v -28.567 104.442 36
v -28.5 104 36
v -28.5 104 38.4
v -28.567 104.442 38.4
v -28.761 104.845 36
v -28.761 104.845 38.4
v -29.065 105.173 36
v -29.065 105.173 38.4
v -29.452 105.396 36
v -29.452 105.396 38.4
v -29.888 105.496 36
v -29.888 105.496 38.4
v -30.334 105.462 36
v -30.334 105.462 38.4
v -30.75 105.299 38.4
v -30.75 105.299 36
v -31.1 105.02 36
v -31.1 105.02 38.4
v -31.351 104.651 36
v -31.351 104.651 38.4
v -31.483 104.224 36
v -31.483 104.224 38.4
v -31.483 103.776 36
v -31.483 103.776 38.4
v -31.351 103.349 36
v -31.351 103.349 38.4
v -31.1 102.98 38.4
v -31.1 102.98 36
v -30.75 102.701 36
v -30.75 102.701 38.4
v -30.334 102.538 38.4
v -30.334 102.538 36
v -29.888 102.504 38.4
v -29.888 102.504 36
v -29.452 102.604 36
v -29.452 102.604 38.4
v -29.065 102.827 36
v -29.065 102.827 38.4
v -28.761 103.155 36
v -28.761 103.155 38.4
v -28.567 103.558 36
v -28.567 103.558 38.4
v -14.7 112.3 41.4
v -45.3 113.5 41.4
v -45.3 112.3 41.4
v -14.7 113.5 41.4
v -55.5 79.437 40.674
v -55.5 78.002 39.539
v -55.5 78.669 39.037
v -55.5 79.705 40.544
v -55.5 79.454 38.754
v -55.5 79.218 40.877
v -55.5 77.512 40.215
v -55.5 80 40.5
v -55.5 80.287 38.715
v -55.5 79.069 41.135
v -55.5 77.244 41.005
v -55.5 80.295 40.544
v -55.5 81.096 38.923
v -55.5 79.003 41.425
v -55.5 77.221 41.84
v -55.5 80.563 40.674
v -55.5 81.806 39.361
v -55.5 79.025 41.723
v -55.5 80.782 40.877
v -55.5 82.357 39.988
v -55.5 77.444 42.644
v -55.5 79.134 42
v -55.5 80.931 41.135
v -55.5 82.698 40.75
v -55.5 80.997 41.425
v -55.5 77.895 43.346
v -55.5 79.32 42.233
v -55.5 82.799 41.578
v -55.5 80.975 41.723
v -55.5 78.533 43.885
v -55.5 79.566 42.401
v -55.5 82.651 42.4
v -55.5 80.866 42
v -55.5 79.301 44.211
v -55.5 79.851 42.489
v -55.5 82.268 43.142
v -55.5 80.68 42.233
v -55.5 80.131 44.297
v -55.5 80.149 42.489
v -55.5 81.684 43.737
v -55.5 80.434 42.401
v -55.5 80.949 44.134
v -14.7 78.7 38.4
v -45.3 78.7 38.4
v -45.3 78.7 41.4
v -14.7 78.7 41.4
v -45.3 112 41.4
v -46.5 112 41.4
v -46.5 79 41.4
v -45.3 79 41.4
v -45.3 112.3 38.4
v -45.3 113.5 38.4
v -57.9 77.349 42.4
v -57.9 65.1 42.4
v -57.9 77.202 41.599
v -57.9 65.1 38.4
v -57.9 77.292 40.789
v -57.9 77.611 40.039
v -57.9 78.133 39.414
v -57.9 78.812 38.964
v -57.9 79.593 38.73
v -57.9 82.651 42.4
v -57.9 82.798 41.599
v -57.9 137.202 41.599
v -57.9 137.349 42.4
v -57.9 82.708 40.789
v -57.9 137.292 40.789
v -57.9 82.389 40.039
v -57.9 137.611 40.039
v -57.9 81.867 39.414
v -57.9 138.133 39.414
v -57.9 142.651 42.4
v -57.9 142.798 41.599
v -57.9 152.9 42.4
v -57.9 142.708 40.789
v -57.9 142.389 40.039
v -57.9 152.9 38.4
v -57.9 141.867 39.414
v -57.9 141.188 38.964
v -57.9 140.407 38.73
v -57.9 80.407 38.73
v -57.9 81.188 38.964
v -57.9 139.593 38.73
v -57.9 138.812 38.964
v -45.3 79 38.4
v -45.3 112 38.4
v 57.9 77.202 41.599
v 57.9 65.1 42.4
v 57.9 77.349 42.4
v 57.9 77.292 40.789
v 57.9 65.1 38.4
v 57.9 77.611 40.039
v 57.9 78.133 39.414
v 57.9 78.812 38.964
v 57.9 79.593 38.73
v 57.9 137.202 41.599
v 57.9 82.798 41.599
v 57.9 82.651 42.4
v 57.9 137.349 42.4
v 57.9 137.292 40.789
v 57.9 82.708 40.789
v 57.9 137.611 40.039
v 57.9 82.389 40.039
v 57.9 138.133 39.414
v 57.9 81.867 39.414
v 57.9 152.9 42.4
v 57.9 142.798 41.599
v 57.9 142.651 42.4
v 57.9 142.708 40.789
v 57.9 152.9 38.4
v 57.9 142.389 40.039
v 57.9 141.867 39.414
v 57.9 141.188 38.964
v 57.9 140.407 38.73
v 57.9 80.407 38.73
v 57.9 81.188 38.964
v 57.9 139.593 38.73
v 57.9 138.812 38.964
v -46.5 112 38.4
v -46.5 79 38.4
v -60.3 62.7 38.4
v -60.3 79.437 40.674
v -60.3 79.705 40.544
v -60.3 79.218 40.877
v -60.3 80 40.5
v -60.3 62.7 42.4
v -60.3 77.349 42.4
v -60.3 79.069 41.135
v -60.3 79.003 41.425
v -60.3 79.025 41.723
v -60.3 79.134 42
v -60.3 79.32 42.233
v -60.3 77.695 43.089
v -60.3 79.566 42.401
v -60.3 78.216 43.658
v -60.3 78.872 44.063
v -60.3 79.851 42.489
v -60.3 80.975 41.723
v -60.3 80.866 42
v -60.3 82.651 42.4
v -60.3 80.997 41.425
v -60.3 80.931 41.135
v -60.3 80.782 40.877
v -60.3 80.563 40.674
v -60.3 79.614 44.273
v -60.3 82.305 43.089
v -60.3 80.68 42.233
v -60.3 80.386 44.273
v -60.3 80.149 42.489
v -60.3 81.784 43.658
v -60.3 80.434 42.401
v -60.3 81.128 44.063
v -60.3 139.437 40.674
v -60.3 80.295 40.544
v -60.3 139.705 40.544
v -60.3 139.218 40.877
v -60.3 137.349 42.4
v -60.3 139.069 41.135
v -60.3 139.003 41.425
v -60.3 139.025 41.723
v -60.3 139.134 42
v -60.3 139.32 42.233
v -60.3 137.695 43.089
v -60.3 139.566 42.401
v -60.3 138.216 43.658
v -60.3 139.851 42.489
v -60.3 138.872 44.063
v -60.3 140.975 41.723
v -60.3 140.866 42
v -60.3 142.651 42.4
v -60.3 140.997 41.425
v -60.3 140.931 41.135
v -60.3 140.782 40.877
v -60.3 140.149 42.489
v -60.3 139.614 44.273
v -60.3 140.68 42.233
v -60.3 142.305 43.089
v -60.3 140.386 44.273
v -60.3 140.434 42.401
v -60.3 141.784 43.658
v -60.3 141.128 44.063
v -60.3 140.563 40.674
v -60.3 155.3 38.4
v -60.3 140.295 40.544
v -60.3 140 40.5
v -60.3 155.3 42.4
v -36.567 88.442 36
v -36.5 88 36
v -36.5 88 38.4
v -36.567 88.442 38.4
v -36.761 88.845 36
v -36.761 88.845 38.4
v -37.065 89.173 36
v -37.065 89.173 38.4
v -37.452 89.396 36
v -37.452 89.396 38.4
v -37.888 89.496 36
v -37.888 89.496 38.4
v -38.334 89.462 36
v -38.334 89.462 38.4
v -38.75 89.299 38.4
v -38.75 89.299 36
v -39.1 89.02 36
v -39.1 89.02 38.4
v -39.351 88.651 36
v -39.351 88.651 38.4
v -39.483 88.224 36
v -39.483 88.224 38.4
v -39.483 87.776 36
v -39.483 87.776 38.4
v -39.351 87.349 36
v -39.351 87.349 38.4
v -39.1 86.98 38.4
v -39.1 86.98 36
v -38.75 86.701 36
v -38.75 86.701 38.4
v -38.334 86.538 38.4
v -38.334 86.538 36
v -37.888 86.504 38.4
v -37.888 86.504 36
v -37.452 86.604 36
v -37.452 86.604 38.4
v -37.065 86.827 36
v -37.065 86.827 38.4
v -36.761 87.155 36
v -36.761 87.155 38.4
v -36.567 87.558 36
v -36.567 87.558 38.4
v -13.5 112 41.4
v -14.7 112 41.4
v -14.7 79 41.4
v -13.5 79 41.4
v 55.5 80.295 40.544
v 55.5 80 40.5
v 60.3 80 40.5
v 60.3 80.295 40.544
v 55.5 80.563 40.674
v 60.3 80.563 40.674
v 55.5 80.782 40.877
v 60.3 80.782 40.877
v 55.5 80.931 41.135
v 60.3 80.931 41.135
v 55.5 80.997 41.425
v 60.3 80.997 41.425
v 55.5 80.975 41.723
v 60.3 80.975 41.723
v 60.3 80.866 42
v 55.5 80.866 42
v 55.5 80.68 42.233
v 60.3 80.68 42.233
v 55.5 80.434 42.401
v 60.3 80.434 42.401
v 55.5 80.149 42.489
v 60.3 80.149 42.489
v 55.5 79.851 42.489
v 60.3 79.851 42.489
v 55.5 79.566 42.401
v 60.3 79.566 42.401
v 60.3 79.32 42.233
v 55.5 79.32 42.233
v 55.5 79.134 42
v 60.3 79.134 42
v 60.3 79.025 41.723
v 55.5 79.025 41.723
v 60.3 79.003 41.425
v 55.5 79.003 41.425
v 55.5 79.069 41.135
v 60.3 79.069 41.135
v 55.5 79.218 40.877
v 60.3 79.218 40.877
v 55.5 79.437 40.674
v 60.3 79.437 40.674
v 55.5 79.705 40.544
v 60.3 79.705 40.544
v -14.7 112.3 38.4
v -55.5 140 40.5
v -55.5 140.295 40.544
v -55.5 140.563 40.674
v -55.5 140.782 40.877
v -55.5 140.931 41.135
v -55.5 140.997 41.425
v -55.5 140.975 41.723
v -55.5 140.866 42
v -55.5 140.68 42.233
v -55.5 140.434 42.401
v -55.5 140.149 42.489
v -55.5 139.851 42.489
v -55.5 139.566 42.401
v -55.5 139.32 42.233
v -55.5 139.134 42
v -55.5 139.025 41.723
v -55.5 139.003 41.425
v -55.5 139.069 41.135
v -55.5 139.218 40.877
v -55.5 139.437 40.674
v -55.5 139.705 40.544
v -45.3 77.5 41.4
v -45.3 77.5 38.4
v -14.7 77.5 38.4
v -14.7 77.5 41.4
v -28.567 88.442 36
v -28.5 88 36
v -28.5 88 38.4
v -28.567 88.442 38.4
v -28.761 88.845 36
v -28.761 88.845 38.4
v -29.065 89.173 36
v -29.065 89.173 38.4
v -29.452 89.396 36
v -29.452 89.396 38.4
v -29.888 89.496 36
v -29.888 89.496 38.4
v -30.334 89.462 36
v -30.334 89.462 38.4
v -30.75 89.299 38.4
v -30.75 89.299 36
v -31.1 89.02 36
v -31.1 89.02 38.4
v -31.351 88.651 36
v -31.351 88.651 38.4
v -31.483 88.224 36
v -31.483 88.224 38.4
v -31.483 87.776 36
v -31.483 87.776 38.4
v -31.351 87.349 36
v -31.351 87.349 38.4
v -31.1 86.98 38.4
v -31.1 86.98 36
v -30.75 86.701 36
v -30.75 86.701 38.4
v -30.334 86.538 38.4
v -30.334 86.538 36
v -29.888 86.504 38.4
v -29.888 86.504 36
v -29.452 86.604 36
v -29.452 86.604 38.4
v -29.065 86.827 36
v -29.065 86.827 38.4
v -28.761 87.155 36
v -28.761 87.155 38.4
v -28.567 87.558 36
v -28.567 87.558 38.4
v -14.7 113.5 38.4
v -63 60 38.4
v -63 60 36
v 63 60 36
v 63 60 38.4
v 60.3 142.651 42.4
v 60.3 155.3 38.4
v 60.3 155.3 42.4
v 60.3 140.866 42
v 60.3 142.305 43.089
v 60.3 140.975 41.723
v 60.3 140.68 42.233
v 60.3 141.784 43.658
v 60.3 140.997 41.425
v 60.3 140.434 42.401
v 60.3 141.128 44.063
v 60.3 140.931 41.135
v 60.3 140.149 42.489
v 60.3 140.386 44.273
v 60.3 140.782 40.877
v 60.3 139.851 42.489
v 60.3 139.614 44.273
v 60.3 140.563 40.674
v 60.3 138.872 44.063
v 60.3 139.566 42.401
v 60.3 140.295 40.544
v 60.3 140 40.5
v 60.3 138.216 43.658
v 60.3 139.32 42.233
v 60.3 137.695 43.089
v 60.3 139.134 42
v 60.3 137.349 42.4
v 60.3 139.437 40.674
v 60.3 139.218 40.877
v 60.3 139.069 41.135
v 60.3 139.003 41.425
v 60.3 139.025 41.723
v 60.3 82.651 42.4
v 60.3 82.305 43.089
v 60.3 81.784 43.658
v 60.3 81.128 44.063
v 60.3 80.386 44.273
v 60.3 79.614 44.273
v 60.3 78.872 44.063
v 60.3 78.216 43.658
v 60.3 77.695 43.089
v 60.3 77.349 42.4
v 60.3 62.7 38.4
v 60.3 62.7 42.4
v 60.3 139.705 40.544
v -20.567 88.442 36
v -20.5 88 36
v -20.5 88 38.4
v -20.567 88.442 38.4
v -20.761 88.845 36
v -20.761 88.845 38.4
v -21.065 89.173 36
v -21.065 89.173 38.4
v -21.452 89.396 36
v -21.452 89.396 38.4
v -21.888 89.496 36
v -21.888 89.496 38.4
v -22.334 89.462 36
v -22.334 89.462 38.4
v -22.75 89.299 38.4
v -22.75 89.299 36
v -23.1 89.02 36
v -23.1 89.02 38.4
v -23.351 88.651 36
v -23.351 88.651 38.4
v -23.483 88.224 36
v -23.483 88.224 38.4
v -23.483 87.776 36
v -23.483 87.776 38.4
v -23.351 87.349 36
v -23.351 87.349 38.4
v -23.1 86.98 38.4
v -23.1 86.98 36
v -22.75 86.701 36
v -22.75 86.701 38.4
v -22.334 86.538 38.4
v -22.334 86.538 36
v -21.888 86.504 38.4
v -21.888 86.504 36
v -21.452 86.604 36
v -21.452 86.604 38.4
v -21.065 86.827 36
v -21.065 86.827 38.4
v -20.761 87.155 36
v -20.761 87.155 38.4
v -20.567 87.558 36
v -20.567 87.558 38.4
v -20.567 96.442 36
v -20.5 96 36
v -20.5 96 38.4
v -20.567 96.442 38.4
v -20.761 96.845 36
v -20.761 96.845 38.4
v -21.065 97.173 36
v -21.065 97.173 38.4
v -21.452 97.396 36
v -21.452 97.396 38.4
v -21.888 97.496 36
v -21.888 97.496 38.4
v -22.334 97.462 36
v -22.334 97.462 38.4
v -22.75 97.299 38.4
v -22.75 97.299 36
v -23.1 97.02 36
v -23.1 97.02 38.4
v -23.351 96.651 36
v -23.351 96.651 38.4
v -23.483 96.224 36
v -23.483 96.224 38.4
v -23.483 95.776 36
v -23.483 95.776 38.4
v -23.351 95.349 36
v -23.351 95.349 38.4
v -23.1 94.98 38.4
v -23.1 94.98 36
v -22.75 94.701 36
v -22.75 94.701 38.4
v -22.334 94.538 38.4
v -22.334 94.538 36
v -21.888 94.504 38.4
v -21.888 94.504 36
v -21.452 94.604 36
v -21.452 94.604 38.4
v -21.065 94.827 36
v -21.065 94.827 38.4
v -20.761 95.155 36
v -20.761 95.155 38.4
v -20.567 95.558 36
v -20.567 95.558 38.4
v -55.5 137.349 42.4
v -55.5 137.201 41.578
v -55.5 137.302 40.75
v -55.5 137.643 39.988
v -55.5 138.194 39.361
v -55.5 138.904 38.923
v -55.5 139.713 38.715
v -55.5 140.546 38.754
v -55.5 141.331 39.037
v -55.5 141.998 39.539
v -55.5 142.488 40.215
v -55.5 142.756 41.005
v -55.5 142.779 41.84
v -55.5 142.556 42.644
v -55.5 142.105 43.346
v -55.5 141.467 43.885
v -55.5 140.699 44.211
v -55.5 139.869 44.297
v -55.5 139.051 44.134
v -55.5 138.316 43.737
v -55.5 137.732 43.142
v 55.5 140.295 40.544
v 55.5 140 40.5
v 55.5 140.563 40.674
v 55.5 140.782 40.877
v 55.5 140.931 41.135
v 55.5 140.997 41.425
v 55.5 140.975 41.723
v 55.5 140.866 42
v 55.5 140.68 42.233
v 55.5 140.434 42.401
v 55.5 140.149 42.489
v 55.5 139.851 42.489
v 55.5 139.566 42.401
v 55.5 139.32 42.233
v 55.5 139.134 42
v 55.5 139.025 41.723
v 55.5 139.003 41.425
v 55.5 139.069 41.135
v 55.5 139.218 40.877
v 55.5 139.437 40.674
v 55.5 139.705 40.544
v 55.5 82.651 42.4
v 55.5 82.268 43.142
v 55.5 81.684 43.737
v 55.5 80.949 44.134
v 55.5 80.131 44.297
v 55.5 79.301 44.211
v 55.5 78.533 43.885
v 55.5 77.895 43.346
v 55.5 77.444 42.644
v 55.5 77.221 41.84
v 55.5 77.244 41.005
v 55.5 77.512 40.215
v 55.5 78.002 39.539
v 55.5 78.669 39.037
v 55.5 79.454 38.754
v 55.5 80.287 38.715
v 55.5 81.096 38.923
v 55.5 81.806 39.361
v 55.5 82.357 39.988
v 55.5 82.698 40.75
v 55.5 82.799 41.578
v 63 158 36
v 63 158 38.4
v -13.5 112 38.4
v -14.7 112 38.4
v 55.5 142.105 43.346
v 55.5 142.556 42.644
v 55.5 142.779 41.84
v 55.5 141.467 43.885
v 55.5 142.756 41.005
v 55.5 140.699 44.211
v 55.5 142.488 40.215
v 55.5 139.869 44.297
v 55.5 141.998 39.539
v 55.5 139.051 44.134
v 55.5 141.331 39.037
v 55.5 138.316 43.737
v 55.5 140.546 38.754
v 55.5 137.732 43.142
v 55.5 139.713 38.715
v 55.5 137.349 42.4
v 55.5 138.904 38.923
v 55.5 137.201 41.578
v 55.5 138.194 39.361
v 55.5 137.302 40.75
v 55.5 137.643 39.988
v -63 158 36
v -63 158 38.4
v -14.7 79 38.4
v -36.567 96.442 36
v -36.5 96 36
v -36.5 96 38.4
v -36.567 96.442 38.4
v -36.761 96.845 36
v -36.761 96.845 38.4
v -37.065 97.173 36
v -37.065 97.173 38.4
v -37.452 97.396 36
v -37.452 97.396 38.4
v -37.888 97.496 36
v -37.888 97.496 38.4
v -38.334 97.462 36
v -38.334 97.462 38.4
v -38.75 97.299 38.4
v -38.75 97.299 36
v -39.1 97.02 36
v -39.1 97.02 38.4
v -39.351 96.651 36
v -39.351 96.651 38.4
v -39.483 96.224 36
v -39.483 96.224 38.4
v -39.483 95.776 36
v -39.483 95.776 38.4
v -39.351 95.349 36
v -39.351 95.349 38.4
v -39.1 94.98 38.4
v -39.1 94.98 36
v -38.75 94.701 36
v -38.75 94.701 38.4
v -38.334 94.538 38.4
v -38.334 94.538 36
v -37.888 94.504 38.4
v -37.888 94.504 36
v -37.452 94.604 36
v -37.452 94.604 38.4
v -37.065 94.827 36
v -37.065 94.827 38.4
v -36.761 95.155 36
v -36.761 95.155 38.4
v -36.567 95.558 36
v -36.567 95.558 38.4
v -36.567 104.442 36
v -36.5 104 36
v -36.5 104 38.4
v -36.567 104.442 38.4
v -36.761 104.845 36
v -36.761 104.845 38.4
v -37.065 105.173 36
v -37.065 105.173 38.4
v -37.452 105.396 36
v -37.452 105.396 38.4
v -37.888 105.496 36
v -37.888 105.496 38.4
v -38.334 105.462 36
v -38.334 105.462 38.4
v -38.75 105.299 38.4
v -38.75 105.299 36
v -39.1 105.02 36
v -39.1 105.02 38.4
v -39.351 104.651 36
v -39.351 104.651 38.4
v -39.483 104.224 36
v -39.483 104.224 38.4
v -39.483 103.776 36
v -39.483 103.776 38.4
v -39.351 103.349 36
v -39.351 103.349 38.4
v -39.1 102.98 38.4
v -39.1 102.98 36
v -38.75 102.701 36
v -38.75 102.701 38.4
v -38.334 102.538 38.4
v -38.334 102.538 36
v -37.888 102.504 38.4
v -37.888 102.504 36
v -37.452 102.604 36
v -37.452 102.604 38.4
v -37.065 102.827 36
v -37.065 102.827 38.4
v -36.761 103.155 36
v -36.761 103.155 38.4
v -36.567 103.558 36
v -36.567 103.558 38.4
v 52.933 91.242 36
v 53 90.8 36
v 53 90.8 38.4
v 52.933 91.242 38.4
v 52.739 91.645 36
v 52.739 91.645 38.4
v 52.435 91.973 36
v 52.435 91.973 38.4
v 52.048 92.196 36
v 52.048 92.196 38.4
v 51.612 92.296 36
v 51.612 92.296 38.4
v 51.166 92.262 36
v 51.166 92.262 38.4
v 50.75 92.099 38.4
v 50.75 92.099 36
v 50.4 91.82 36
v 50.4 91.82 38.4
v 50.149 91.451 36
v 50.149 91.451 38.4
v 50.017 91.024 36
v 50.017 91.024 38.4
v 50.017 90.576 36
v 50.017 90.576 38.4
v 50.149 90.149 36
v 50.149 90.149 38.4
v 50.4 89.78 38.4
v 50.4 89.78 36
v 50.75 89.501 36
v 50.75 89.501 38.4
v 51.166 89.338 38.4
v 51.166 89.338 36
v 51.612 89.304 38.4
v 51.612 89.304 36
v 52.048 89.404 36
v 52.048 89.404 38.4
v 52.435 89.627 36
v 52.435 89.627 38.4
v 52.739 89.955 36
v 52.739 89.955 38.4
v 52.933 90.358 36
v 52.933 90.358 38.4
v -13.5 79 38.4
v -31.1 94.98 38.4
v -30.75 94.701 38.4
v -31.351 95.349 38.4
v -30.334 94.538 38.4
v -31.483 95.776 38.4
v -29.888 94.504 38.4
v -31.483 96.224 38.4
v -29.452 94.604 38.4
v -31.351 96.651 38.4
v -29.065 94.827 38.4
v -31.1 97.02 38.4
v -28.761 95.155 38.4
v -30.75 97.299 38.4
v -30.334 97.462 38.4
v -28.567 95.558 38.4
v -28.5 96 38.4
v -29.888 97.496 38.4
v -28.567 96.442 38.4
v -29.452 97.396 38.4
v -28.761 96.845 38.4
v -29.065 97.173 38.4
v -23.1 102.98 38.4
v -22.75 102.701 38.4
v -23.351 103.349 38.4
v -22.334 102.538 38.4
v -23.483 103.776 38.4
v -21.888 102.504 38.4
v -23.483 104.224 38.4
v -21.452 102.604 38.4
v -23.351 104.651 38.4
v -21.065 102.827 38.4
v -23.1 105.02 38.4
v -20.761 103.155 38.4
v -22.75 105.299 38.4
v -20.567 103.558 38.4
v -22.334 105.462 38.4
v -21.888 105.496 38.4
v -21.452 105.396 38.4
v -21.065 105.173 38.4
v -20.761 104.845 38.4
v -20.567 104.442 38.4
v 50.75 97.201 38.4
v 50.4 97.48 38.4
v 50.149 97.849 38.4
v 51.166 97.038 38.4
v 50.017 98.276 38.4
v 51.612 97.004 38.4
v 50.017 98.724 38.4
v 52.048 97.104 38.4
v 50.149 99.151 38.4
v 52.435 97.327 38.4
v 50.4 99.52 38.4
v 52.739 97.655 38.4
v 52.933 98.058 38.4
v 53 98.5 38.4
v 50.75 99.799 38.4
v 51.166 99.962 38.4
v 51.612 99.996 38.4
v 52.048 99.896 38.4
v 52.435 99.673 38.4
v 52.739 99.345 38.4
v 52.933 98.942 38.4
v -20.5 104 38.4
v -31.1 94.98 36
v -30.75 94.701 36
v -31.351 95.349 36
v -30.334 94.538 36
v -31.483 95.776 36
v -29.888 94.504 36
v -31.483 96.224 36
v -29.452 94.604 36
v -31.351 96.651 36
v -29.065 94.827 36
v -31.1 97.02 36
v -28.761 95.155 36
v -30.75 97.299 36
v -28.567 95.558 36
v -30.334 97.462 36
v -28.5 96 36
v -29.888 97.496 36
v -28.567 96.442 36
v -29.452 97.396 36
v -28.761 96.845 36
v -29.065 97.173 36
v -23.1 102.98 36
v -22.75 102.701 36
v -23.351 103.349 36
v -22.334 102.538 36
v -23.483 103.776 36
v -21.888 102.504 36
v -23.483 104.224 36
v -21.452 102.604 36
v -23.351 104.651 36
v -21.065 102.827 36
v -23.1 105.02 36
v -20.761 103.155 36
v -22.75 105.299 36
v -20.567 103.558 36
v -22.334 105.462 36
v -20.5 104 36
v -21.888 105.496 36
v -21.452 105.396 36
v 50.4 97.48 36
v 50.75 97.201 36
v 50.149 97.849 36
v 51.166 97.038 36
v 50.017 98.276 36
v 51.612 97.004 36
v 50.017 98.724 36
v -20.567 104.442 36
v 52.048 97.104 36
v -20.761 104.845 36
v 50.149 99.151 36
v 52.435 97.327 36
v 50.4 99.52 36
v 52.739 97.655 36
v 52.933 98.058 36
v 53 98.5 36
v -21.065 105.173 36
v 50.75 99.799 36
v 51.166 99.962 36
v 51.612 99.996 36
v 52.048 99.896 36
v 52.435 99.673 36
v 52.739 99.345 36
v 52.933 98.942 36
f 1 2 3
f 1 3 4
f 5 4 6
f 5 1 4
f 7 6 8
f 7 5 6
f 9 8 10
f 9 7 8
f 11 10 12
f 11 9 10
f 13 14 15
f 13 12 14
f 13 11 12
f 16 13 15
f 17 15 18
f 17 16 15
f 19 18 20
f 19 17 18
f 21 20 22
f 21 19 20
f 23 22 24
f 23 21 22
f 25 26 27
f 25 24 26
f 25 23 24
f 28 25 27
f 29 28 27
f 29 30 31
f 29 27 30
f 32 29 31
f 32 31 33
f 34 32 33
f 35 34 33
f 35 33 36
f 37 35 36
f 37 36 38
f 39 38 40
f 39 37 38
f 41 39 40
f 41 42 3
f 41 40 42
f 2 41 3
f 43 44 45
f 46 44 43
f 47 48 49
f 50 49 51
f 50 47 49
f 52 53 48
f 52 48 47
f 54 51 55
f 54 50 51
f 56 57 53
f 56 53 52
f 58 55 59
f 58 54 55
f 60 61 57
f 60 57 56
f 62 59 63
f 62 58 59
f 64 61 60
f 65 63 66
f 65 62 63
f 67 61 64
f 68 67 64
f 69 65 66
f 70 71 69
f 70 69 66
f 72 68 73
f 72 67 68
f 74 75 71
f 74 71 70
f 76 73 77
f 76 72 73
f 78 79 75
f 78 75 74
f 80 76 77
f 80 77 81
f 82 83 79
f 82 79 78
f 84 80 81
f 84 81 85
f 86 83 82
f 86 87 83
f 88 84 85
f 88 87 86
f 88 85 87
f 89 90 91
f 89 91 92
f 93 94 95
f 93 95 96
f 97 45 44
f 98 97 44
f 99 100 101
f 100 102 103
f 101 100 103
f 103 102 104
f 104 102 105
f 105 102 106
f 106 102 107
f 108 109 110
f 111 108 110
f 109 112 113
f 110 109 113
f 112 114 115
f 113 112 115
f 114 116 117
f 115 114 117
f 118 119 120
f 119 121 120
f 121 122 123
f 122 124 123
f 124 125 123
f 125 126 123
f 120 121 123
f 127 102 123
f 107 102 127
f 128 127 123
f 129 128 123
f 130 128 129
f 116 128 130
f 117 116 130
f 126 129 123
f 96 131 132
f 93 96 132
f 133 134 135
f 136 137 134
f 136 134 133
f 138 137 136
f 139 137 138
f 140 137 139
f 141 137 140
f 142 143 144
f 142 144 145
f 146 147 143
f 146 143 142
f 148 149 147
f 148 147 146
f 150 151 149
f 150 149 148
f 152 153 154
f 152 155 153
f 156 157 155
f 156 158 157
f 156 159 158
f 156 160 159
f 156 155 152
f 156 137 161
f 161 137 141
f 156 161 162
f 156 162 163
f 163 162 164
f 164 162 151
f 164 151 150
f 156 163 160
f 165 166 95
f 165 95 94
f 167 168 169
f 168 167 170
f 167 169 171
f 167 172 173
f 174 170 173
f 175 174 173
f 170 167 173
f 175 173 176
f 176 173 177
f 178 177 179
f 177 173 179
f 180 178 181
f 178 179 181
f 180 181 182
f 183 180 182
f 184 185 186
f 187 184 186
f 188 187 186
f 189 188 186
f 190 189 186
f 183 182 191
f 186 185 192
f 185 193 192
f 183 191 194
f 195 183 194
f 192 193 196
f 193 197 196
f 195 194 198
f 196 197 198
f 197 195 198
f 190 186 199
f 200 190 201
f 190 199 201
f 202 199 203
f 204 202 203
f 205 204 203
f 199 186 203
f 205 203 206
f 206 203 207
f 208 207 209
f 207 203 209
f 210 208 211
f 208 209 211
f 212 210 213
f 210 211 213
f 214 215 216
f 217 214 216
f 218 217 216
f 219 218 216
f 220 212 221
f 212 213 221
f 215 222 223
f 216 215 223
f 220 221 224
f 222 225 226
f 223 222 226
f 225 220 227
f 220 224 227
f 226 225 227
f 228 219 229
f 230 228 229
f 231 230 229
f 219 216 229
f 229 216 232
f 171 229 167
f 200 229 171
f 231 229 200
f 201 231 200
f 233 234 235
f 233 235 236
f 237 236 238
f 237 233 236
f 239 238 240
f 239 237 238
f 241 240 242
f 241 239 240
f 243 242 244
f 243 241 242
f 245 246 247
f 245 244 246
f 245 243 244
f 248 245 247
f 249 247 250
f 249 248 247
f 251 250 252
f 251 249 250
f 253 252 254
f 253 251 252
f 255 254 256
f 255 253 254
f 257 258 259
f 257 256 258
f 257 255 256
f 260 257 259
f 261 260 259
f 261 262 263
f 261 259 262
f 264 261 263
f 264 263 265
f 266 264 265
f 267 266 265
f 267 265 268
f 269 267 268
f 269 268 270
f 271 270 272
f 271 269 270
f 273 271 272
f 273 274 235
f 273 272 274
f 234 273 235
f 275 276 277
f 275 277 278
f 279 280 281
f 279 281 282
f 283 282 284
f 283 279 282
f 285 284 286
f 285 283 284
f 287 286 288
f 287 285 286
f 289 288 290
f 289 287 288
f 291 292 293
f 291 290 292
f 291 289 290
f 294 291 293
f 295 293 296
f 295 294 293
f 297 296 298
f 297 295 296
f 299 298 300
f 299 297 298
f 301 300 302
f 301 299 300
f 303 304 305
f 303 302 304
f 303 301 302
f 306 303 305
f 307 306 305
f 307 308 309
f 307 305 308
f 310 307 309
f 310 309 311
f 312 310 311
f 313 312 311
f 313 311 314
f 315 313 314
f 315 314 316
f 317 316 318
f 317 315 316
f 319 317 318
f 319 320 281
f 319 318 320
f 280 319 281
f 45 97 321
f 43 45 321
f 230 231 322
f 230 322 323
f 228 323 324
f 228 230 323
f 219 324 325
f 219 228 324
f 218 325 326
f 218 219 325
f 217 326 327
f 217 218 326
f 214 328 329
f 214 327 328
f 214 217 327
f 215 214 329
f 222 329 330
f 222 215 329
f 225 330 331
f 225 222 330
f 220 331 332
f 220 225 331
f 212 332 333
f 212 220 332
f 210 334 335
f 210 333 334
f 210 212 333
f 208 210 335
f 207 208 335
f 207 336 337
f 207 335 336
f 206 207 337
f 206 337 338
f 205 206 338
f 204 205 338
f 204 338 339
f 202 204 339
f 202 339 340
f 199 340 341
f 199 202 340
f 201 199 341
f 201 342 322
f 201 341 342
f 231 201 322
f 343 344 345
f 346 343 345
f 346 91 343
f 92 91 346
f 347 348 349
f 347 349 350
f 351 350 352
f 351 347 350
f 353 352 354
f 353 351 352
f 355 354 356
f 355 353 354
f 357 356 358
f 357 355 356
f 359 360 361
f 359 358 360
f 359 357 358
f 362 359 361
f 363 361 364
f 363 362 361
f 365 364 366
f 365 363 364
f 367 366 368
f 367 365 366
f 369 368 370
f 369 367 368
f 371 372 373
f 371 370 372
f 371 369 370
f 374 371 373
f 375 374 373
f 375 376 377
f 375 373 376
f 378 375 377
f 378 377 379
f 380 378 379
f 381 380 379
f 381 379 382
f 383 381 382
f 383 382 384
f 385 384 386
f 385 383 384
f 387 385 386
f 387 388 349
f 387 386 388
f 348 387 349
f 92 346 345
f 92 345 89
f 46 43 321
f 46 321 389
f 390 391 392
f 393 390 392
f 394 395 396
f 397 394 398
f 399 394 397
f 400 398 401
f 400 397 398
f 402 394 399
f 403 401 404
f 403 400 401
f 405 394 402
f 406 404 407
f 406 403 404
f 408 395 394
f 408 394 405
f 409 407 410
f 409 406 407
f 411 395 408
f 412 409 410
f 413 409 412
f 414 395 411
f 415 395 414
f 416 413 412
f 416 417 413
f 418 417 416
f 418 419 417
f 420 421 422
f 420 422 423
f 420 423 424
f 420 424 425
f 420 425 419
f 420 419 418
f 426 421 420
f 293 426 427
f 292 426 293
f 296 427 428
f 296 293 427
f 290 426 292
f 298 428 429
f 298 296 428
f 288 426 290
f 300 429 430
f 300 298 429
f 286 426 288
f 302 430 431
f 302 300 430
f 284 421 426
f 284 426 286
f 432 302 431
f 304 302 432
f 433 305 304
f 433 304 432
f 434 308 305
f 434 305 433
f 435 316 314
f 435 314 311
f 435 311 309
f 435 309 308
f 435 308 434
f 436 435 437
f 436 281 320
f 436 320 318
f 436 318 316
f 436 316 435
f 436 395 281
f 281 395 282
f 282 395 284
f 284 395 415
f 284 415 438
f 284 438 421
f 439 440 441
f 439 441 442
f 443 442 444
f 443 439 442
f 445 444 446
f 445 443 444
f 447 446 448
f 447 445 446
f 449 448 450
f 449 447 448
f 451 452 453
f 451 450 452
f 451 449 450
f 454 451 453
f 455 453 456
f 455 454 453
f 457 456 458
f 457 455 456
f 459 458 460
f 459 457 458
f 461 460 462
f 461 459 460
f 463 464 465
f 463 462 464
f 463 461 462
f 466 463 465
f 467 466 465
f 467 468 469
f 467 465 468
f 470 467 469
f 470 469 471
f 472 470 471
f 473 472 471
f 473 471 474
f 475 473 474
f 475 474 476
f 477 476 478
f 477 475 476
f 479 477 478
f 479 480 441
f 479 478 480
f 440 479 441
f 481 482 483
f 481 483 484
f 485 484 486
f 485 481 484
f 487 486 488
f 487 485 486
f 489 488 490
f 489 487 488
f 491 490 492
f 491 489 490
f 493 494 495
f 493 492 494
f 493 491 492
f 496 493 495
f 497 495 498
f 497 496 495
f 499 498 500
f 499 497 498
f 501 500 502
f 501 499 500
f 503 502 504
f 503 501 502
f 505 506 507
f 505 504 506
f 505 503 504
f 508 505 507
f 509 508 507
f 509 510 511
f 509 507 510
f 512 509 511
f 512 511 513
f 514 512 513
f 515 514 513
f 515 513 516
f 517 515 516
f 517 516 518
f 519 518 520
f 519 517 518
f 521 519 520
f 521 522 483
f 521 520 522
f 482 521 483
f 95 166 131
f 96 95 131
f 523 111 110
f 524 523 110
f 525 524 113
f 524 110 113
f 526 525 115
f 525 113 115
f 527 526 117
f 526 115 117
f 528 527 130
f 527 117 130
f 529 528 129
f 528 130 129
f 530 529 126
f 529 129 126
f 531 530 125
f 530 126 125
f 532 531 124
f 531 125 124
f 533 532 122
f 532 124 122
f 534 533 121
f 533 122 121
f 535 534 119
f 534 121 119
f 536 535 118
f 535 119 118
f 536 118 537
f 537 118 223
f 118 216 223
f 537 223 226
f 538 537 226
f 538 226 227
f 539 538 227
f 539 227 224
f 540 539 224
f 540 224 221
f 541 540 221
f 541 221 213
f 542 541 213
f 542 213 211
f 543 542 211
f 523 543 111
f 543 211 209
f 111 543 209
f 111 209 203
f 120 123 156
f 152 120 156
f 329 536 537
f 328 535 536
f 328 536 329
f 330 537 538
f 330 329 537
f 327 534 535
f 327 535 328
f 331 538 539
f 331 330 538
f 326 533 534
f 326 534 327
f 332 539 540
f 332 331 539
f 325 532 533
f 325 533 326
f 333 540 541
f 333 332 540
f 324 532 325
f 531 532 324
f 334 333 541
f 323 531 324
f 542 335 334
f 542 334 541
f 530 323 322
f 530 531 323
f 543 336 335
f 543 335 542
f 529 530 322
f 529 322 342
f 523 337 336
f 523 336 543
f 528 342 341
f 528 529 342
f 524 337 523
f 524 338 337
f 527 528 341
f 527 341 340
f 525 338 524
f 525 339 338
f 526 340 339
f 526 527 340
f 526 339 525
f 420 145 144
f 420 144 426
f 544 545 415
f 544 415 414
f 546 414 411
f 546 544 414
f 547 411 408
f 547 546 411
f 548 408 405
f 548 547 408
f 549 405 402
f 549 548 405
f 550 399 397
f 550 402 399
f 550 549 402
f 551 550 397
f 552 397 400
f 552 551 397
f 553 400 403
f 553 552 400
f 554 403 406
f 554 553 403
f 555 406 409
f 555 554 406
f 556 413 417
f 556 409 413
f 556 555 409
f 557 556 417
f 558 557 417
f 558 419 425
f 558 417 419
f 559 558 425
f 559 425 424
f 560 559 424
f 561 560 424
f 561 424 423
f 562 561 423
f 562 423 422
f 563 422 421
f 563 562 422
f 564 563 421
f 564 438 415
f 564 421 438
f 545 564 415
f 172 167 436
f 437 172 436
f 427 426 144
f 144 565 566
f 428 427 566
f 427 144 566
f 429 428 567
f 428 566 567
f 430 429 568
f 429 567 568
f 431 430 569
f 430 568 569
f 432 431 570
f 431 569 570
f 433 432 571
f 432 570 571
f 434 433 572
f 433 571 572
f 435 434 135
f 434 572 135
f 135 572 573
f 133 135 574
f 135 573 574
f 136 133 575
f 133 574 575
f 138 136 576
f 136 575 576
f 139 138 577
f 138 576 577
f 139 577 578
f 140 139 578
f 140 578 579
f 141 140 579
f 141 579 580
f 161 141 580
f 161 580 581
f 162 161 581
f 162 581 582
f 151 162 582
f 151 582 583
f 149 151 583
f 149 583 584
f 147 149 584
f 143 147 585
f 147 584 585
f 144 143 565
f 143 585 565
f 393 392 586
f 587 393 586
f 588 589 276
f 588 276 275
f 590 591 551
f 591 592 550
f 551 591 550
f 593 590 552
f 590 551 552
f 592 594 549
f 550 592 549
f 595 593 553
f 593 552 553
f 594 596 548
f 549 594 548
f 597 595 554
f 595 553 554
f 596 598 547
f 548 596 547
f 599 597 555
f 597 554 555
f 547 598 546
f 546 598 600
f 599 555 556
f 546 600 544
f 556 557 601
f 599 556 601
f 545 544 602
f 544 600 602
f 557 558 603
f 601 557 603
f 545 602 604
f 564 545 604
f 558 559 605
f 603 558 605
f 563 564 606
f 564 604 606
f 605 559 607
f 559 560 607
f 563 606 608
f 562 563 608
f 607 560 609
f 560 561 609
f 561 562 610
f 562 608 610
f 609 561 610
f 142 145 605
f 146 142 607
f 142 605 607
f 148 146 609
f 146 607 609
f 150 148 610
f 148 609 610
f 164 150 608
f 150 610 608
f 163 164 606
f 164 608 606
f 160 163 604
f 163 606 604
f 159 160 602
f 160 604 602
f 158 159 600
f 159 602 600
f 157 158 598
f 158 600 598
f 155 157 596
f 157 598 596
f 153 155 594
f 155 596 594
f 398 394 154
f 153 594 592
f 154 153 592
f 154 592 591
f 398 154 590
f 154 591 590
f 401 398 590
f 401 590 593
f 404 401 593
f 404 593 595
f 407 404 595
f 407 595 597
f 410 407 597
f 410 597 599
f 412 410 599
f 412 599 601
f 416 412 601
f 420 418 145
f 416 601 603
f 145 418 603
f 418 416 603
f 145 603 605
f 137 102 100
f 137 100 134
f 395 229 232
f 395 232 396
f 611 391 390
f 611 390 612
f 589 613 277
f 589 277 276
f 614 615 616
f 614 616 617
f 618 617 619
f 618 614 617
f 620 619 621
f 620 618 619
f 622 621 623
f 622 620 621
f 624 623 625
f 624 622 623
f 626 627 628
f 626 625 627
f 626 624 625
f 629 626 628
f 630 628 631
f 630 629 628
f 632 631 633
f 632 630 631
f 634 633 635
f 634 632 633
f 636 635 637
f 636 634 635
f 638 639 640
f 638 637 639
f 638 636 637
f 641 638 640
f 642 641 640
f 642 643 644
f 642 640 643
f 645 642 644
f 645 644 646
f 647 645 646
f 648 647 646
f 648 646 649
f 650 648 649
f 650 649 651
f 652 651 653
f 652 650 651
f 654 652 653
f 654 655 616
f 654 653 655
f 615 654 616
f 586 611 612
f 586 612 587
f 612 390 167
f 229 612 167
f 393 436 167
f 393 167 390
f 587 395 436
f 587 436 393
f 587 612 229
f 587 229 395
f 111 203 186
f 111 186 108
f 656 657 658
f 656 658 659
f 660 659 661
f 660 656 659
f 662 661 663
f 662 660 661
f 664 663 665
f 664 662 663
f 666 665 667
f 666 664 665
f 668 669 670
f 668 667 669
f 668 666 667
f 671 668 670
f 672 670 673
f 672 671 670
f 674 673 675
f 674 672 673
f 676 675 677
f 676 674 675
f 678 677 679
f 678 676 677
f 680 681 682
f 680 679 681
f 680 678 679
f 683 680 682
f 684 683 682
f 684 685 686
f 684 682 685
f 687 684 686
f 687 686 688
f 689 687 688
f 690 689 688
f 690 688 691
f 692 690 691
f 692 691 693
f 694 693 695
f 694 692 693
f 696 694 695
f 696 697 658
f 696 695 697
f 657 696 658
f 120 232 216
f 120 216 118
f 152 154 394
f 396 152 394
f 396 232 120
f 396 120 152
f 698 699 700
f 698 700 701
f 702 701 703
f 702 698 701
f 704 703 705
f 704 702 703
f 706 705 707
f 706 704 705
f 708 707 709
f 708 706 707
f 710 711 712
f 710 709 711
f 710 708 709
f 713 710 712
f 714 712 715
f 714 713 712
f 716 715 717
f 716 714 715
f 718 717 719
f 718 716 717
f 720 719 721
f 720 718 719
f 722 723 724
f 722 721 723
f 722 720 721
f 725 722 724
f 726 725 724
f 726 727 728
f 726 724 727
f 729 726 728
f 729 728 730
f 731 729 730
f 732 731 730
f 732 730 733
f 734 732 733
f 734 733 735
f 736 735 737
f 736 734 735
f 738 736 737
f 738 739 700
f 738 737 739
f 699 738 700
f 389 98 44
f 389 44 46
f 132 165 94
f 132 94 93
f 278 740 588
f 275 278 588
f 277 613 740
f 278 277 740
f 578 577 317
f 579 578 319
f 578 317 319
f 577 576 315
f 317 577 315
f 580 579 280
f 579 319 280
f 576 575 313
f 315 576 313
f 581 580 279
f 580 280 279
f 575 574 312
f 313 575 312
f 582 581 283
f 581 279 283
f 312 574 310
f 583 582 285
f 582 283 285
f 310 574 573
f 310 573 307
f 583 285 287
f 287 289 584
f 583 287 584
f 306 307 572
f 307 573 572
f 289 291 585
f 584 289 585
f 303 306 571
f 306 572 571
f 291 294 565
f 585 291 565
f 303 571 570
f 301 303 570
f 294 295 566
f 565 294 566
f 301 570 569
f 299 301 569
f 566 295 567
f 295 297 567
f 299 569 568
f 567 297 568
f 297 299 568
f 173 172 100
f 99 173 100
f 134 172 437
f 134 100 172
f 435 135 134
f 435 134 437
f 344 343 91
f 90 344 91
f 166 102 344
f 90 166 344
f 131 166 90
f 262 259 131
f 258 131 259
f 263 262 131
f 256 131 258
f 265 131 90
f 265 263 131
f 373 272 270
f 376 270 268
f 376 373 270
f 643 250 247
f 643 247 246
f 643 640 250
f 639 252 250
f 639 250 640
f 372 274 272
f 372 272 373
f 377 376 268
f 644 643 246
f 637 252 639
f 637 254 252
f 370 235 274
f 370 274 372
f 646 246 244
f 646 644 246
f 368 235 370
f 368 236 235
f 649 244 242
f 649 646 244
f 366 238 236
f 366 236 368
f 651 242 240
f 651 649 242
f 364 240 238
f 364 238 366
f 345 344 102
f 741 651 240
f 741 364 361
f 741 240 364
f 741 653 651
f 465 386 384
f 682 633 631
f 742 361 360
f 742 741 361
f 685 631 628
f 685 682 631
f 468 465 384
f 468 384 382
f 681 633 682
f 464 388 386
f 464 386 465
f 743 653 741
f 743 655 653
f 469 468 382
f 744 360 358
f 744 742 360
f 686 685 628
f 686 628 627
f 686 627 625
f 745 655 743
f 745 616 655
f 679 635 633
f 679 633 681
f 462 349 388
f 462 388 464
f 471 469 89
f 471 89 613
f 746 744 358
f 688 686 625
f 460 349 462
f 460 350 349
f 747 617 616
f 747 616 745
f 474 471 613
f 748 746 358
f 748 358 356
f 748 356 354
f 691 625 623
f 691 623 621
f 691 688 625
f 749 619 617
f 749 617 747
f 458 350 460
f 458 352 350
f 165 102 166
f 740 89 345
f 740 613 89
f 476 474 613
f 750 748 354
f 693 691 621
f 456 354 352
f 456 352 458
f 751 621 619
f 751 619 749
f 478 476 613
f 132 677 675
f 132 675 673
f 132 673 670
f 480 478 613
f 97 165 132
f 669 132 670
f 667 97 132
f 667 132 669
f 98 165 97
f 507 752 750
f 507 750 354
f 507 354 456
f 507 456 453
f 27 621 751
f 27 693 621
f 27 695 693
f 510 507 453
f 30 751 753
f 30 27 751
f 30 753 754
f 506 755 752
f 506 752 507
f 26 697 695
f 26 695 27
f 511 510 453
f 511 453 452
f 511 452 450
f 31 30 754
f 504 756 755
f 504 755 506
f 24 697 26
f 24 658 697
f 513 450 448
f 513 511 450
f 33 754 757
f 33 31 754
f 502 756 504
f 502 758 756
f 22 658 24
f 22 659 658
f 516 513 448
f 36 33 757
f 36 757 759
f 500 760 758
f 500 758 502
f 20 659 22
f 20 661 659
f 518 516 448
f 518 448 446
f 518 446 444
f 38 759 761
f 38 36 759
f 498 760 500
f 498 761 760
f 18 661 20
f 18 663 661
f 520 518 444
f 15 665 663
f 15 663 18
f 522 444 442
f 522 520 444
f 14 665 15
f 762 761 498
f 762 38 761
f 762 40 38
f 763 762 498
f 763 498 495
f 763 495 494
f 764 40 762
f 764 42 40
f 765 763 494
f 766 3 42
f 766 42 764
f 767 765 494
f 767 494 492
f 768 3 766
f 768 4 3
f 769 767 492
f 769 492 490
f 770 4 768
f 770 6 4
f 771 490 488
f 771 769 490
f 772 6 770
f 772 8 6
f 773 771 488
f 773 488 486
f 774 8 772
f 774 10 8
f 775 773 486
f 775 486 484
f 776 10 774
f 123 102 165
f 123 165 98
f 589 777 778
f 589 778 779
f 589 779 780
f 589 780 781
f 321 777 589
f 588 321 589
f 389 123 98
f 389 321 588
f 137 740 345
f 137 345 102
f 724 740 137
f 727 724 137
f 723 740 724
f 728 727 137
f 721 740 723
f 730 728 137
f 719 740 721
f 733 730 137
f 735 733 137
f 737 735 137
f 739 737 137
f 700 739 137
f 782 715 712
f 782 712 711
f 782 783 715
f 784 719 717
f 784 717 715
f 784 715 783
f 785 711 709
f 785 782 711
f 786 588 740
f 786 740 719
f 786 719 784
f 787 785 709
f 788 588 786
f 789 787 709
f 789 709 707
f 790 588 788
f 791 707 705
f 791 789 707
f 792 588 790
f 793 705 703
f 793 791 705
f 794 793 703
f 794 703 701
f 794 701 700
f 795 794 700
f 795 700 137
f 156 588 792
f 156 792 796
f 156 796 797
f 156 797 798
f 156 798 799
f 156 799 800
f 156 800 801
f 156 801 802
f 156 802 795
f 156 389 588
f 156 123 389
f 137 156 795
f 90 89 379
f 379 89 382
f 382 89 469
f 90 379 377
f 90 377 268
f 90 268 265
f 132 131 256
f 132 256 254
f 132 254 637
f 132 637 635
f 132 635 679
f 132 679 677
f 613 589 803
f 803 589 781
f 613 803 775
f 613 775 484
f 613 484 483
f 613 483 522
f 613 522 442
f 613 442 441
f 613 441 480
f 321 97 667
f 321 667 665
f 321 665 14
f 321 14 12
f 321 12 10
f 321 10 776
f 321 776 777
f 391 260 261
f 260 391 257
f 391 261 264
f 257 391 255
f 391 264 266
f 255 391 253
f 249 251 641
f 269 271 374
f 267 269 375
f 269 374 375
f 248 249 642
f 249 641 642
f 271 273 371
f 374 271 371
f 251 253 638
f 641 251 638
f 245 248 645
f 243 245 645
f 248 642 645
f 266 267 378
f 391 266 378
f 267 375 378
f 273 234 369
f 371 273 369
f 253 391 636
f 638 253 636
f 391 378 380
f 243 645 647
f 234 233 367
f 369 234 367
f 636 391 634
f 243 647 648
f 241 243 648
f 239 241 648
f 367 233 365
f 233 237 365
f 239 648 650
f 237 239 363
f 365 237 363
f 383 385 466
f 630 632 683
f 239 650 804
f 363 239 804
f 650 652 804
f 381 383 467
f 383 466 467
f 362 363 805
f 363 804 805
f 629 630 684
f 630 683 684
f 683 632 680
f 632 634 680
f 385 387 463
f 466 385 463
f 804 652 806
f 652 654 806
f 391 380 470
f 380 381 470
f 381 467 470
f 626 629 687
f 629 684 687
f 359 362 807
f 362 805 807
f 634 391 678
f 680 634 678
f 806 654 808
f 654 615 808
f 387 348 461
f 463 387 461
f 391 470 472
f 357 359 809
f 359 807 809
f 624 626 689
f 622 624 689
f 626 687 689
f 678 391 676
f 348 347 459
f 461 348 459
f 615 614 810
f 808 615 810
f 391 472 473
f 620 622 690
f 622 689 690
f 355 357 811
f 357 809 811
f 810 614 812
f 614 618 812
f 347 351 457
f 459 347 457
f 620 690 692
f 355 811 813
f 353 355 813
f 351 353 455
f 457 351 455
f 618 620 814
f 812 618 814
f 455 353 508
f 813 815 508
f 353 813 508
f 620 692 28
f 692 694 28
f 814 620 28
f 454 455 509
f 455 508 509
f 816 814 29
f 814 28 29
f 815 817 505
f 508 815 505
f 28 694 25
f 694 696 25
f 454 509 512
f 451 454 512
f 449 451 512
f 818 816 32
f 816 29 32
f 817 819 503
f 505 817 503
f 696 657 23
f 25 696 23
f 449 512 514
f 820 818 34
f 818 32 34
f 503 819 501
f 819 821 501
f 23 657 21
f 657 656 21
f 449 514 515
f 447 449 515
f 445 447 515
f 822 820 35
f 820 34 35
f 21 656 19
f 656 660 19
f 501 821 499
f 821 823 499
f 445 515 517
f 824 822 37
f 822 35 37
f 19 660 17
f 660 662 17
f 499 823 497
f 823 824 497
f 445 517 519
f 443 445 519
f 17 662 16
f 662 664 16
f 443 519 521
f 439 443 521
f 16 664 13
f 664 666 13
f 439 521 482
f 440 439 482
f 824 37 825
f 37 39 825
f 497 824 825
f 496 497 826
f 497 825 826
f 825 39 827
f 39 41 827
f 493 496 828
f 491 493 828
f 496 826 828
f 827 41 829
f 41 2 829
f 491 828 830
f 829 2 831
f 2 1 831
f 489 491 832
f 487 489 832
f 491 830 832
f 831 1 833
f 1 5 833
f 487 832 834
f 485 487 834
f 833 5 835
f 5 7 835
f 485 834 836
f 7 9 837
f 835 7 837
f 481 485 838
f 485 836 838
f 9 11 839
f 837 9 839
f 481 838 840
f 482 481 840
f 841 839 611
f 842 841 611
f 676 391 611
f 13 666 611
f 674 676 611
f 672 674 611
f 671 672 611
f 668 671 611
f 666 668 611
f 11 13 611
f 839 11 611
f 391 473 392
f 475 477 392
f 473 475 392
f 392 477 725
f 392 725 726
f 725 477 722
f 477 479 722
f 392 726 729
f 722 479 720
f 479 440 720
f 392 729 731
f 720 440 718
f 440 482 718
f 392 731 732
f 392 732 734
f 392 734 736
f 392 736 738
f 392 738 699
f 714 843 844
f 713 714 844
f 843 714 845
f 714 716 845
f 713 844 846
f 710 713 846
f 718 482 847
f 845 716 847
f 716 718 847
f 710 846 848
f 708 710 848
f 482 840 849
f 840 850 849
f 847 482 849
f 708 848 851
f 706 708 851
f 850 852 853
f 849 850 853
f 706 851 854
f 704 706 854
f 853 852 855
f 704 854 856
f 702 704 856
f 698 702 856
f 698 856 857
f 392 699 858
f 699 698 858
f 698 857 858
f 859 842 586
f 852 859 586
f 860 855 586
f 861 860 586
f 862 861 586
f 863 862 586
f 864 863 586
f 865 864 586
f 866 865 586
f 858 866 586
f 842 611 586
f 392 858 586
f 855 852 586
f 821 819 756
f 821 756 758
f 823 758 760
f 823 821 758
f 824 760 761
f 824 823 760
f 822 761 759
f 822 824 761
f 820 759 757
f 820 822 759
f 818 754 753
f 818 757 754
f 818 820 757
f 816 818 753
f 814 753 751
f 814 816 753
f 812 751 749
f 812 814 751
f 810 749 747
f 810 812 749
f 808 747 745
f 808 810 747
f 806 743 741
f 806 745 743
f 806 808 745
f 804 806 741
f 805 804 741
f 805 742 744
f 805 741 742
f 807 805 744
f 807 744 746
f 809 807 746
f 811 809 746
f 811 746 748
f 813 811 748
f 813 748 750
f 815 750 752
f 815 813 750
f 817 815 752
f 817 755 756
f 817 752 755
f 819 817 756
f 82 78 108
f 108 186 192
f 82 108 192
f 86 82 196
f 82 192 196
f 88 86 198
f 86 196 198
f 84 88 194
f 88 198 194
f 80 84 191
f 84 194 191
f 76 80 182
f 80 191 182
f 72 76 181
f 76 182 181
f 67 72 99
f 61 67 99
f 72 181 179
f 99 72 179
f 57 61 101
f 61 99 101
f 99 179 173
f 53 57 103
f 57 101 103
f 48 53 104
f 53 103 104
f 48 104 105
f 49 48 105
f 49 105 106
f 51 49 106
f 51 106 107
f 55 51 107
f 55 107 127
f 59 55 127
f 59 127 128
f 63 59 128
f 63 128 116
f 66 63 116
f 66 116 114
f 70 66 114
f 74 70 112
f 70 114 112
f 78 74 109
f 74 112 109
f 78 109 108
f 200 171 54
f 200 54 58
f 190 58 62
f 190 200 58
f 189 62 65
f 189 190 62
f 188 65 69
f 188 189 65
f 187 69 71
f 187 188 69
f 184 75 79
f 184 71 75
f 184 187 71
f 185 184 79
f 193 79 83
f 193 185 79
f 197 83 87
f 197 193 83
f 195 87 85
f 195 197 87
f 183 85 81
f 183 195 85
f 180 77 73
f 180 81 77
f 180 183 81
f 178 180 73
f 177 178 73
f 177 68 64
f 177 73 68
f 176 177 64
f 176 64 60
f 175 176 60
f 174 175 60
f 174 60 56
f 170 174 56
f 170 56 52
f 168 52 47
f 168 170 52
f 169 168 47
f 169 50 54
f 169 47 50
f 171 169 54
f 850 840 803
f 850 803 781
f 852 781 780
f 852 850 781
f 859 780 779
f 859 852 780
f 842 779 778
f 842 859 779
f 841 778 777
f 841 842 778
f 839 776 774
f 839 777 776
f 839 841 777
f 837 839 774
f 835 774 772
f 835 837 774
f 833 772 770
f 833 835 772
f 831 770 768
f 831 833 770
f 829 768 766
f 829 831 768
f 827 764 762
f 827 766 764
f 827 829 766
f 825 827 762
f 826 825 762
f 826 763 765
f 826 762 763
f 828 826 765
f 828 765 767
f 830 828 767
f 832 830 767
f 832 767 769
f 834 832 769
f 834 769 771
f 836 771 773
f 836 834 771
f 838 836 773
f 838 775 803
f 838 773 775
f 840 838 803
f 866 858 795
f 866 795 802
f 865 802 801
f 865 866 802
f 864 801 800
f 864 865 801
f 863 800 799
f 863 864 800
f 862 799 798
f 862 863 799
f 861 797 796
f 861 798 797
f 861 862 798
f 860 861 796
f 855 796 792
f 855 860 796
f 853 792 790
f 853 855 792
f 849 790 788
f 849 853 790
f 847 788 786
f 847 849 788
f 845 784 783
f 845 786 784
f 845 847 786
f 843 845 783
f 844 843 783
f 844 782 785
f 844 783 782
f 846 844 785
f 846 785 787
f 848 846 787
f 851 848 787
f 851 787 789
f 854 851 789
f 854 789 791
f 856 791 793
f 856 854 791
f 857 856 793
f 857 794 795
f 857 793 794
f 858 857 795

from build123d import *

# Parameters (mm, degrees)
BOSS_EXTRUDE1_START  = 36
SKETCH1_W            = 126
SKETCH1_H            = 98
BOSS_EXTRUDE1_DEPTH  = 2.4
BOSS_EXTRUDE2_START  = 37.9
SKETCH2_W            = 120.6
SKETCH2_H            = 92.6
BOSS_EXTRUDE2_DEPTH  = 4.5
BOSS_EXTRUDE3_START  = 38.4
SKETCH3_W            = 115.8
SKETCH3_H            = 87.8
BOSS_EXTRUDE3_DEPTH  = 5
BOSS_EXTRUDE4_START  = -60.3
SKETCH4_R            = 2.8
BOSS_EXTRUDE4_DEPTH  = 4.8
BOSS_EXTRUDE5_START  = -61
SKETCH5_R            = 1
BOSS_EXTRUDE5_DEPTH  = 6.5
BOSS_EXTRUDE6_START  = -60.3
SKETCH6_R            = 2.8
BOSS_EXTRUDE6_DEPTH  = 4.8
BOSS_EXTRUDE7_START  = -61
SKETCH7_R            = 1
BOSS_EXTRUDE7_DEPTH  = 6.5
BOSS_EXTRUDE8_START  = 55.5
SKETCH8_R            = 2.8
BOSS_EXTRUDE8_DEPTH  = 4.8
BOSS_EXTRUDE9_START  = 54.5
SKETCH9_R            = 1
BOSS_EXTRUDE9_DEPTH  = 6.5
BOSS_EXTRUDE10_START = 55.5
SKETCH10_R           = 2.8
BOSS_EXTRUDE10_DEPTH = 4.8
BOSS_EXTRUDE11_START = 54.5
SKETCH11_R           = 1
BOSS_EXTRUDE11_DEPTH = 6.5
BOSS_EXTRUDE12_START = 35
SKETCH12_R           = 1.5
BOSS_EXTRUDE12_DEPTH = 4.4
BOSS_EXTRUDE13_START = 35
SKETCH13_R           = 1.5
BOSS_EXTRUDE13_DEPTH = 4.4
BOSS_EXTRUDE14_START = 35
SKETCH14_R           = 1.5
BOSS_EXTRUDE14_DEPTH = 4.4
BOSS_EXTRUDE15_START = 35
SKETCH15_R           = 1.5
BOSS_EXTRUDE15_DEPTH = 4.4
BOSS_EXTRUDE16_START = 35
SKETCH16_R           = 1.5
BOSS_EXTRUDE16_DEPTH = 4.4
BOSS_EXTRUDE17_START = 35
SKETCH17_R           = 1.5
BOSS_EXTRUDE17_DEPTH = 4.4
BOSS_EXTRUDE18_START = 35
SKETCH18_R           = 1.5
BOSS_EXTRUDE18_DEPTH = 4.4
BOSS_EXTRUDE19_START = 35
SKETCH19_R           = 1.5
BOSS_EXTRUDE19_DEPTH = 4.4
BOSS_EXTRUDE20_START = 35
SKETCH20_R           = 1.5
BOSS_EXTRUDE20_DEPTH = 4.4
BOSS_EXTRUDE21_START = 38.4
SKETCH21_W           = 1.2
SKETCH21_H           = 33
BOSS_EXTRUDE21_DEPTH = 3
BOSS_EXTRUDE22_START = 38.4
SKETCH22_W           = 1.2
SKETCH22_H           = 33
BOSS_EXTRUDE22_DEPTH = 3
BOSS_EXTRUDE23_START = 38.4
SKETCH23_W           = 30.6
SKETCH23_H           = 1.2
BOSS_EXTRUDE23_DEPTH = 3
BOSS_EXTRUDE24_START = 38.4
SKETCH24_W           = 30.6
SKETCH24_H           = 1.2
BOSS_EXTRUDE24_DEPTH = 3
BOSS_EXTRUDE25_START = 35
SKETCH25_R           = 1.5
BOSS_EXTRUDE25_DEPTH = 4.4
BOSS_EXTRUDE26_START = 35
SKETCH26_R           = 1.5
BOSS_EXTRUDE26_DEPTH = 4.4


with BuildPart() as part:
    # Sketch1 → Boss-Extrude1 (new body)
    with BuildSketch(Plane.XY.offset(BOSS_EXTRUDE1_START)):
        with Locations((0, 109)):
            Rectangle(SKETCH1_W, SKETCH1_H)
    extrude(amount=BOSS_EXTRUDE1_DEPTH)

    # Sketch2 → Boss-Extrude2 (add)
    with BuildSketch(Plane.XY.offset(BOSS_EXTRUDE2_START)):
        with Locations((0, 109)):
            Rectangle(SKETCH2_W, SKETCH2_H)
    extrude(amount=BOSS_EXTRUDE2_DEPTH)


with BuildPart() as body_2:
    # Sketch3 → Boss-Extrude3 (new body)
    with BuildSketch(Plane.XY.offset(BOSS_EXTRUDE3_START)):
        with Locations((0, 109)):
            Rectangle(SKETCH3_W, SKETCH3_H)
    extrude(amount=BOSS_EXTRUDE3_DEPTH)


with BuildPart() as part_1:
    add(part.part)

    # Combine1: cut body 2
    add(body_2.part, mode=Mode.SUBTRACT)

    # Sketch4 → Boss-Extrude4 (add)
    with BuildSketch(Plane(origin=(0, 0, 0), x_dir=(0, 0, -1), z_dir=(1, 0, 0)).offset(BOSS_EXTRUDE4_START)):
        with Locations((-41.5, 80)):
            Circle(SKETCH4_R)
    extrude(amount=BOSS_EXTRUDE4_DEPTH)


with BuildPart() as body_2_2:
    # Sketch5 → Boss-Extrude5 (new body)
    with BuildSketch(Plane(origin=(0, 0, 0), x_dir=(0, 0, -1), z_dir=(1, 0, 0)).offset(BOSS_EXTRUDE5_START)):
        with Locations((-41.5, 80)):
            Circle(SKETCH5_R)
    extrude(amount=BOSS_EXTRUDE5_DEPTH)


with BuildPart() as part_2:
    add(part_1.part)

    # Combine2: cut body 2 2
    add(body_2_2.part, mode=Mode.SUBTRACT)

    # Sketch6 → Boss-Extrude6 (add)
    with BuildSketch(Plane(origin=(0, 0, 0), x_dir=(0, 0, -1), z_dir=(1, 0, 0)).offset(BOSS_EXTRUDE6_START)):
        with Locations((-41.5, 140)):
            Circle(SKETCH6_R)
    extrude(amount=BOSS_EXTRUDE6_DEPTH)


with BuildPart() as body_2_3:
    # Sketch7 → Boss-Extrude7 (new body)
    with BuildSketch(Plane(origin=(0, 0, 0), x_dir=(0, 0, -1), z_dir=(1, 0, 0)).offset(BOSS_EXTRUDE7_START)):
        with Locations((-41.5, 140)):
            Circle(SKETCH7_R)
    extrude(amount=BOSS_EXTRUDE7_DEPTH)


with BuildPart() as part_3:
    add(part_2.part)

    # Combine3: cut body 2 3
    add(body_2_3.part, mode=Mode.SUBTRACT)

    # Sketch8 → Boss-Extrude8 (add)
    with BuildSketch(Plane(origin=(0, 0, 0), x_dir=(0, 0, -1), z_dir=(1, 0, 0)).offset(BOSS_EXTRUDE8_START)):
        with Locations((-41.5, 80)):
            Circle(SKETCH8_R)
    extrude(amount=BOSS_EXTRUDE8_DEPTH)


with BuildPart() as body_2_4:
    # Sketch9 → Boss-Extrude9 (new body)
    with BuildSketch(Plane(origin=(0, 0, 0), x_dir=(0, 0, -1), z_dir=(1, 0, 0)).offset(BOSS_EXTRUDE9_START)):
        with Locations((-41.5, 80)):
            Circle(SKETCH9_R)
    extrude(amount=BOSS_EXTRUDE9_DEPTH)


with BuildPart() as part_4:
    add(part_3.part)

    # Combine4: cut body 2 4
    add(body_2_4.part, mode=Mode.SUBTRACT)

    # Sketch10 → Boss-Extrude10 (add)
    with BuildSketch(Plane(origin=(0, 0, 0), x_dir=(0, 0, -1), z_dir=(1, 0, 0)).offset(BOSS_EXTRUDE10_START)):
        with Locations((-41.5, 140)):
            Circle(SKETCH10_R)
    extrude(amount=BOSS_EXTRUDE10_DEPTH)


with BuildPart() as body_2_5:
    # Sketch11 → Boss-Extrude11 (new body)
    with BuildSketch(Plane(origin=(0, 0, 0), x_dir=(0, 0, -1), z_dir=(1, 0, 0)).offset(BOSS_EXTRUDE11_START)):
        with Locations((-41.5, 140)):
            Circle(SKETCH11_R)
    extrude(amount=BOSS_EXTRUDE11_DEPTH)


with BuildPart() as part_5:
    add(part_4.part)

    # Combine5: cut body 2 5
    add(body_2_5.part, mode=Mode.SUBTRACT)


with BuildPart() as body_2_6:
    # Sketch12 → Boss-Extrude12 (new body)
    with BuildSketch(Plane.XY.offset(BOSS_EXTRUDE12_START)):
        with Locations((-38, 88)):
            Circle(SKETCH12_R)
    extrude(amount=BOSS_EXTRUDE12_DEPTH)


with BuildPart() as part_6:
    add(part_5.part)

    # Combine6: cut body 2 6
    add(body_2_6.part, mode=Mode.SUBTRACT)


with BuildPart() as body_2_7:
    # Sketch13 → Boss-Extrude13 (new body)
    with BuildSketch(Plane.XY.offset(BOSS_EXTRUDE13_START)):
        with Locations((-38, 96)):
            Circle(SKETCH13_R)
    extrude(amount=BOSS_EXTRUDE13_DEPTH)


with BuildPart() as part_7:
    add(part_6.part)

    # Combine7: cut body 2 7
    add(body_2_7.part, mode=Mode.SUBTRACT)


with BuildPart() as body_2_8:
    # Sketch14 → Boss-Extrude14 (new body)
    with BuildSketch(Plane.XY.offset(BOSS_EXTRUDE14_START)):
        with Locations((-38, 104)):
            Circle(SKETCH14_R)
    extrude(amount=BOSS_EXTRUDE14_DEPTH)


with BuildPart() as part_8:
    add(part_7.part)

    # Combine8: cut body 2 8
    add(body_2_8.part, mode=Mode.SUBTRACT)


with BuildPart() as body_2_9:
    # Sketch15 → Boss-Extrude15 (new body)
    with BuildSketch(Plane.XY.offset(BOSS_EXTRUDE15_START)):
        with Locations((-30, 88)):
            Circle(SKETCH15_R)
    extrude(amount=BOSS_EXTRUDE15_DEPTH)


with BuildPart() as part_9:
    add(part_8.part)

    # Combine9: cut body 2 9
    add(body_2_9.part, mode=Mode.SUBTRACT)


with BuildPart() as body_2_10:
    # Sketch16 → Boss-Extrude16 (new body)
    with BuildSketch(Plane.XY.offset(BOSS_EXTRUDE16_START)):
        with Locations((-30, 96)):
            Circle(SKETCH16_R)
    extrude(amount=BOSS_EXTRUDE16_DEPTH)


with BuildPart() as part_10:
    add(part_9.part)

    # Combine10: cut body 2 10
    add(body_2_10.part, mode=Mode.SUBTRACT)


with BuildPart() as body_2_11:
    # Sketch17 → Boss-Extrude17 (new body)
    with BuildSketch(Plane.XY.offset(BOSS_EXTRUDE17_START)):
        with Locations((-30, 104)):
            Circle(SKETCH17_R)
    extrude(amount=BOSS_EXTRUDE17_DEPTH)


with BuildPart() as part_11:
    add(part_10.part)

    # Combine11: cut body 2 11
    add(body_2_11.part, mode=Mode.SUBTRACT)


with BuildPart() as body_2_12:
    # Sketch18 → Boss-Extrude18 (new body)
    with BuildSketch(Plane.XY.offset(BOSS_EXTRUDE18_START)):
        with Locations((-22, 88)):
            Circle(SKETCH18_R)
    extrude(amount=BOSS_EXTRUDE18_DEPTH)


with BuildPart() as part_12:
    add(part_11.part)

    # Combine12: cut body 2 12
    add(body_2_12.part, mode=Mode.SUBTRACT)


with BuildPart() as body_2_13:
    # Sketch19 → Boss-Extrude19 (new body)
    with BuildSketch(Plane.XY.offset(BOSS_EXTRUDE19_START)):
        with Locations((-22, 96)):
            Circle(SKETCH19_R)
    extrude(amount=BOSS_EXTRUDE19_DEPTH)


with BuildPart() as part_13:
    add(part_12.part)

    # Combine13: cut body 2 13
    add(body_2_13.part, mode=Mode.SUBTRACT)


with BuildPart() as body_2_14:
    # Sketch20 → Boss-Extrude20 (new body)
    with BuildSketch(Plane.XY.offset(BOSS_EXTRUDE20_START)):
        with Locations((-22, 104)):
            Circle(SKETCH20_R)
    extrude(amount=BOSS_EXTRUDE20_DEPTH)


with BuildPart() as part_14:
    add(part_13.part)

    # Combine14: cut body 2 14
    add(body_2_14.part, mode=Mode.SUBTRACT)

    # Sketch21 → Boss-Extrude21 (add)
    with BuildSketch(Plane.XY.offset(BOSS_EXTRUDE21_START)):
        with Locations((-45.9, 95.5)):
            Rectangle(SKETCH21_W, SKETCH21_H)
    extrude(amount=BOSS_EXTRUDE21_DEPTH)

    # Sketch22 → Boss-Extrude22 (add)
    with BuildSketch(Plane.XY.offset(BOSS_EXTRUDE22_START)):
        with Locations((-14.1, 95.5)):
            Rectangle(SKETCH22_W, SKETCH22_H)
    extrude(amount=BOSS_EXTRUDE22_DEPTH)

    # Sketch23 → Boss-Extrude23 (add)
    with BuildSketch(Plane.XY.offset(BOSS_EXTRUDE23_START)):
        with Locations((-30, 112.9)):
            Rectangle(SKETCH23_W, SKETCH23_H)
    extrude(amount=BOSS_EXTRUDE23_DEPTH)

    # Sketch24 → Boss-Extrude24 (add)
    with BuildSketch(Plane.XY.offset(BOSS_EXTRUDE24_START)):
        with Locations((-30, 78.1)):
            Rectangle(SKETCH24_W, SKETCH24_H)
    extrude(amount=BOSS_EXTRUDE24_DEPTH)


with BuildPart() as body_2_15:
    # Sketch25 → Boss-Extrude25 (new body)
    with BuildSketch(Plane.XY.offset(BOSS_EXTRUDE25_START)):
        with Locations((51.5, 98.5)):
            Circle(SKETCH25_R)
    extrude(amount=BOSS_EXTRUDE25_DEPTH)


with BuildPart() as part_15:
    add(part_14.part)

    # Combine15: cut body 2 15
    add(body_2_15.part, mode=Mode.SUBTRACT)


with BuildPart() as body_2_16:
    # Sketch26 → Boss-Extrude26 (new body)
    with BuildSketch(Plane.XY.offset(BOSS_EXTRUDE26_START)):
        with Locations((51.5, 90.8)):
            Circle(SKETCH26_R)
    extrude(amount=BOSS_EXTRUDE26_DEPTH)


with BuildPart() as part_16:
    add(part_15.part)

    # Combine16: cut body 2 16
    add(body_2_16.part, mode=Mode.SUBTRACT)


solid = part_16.part
